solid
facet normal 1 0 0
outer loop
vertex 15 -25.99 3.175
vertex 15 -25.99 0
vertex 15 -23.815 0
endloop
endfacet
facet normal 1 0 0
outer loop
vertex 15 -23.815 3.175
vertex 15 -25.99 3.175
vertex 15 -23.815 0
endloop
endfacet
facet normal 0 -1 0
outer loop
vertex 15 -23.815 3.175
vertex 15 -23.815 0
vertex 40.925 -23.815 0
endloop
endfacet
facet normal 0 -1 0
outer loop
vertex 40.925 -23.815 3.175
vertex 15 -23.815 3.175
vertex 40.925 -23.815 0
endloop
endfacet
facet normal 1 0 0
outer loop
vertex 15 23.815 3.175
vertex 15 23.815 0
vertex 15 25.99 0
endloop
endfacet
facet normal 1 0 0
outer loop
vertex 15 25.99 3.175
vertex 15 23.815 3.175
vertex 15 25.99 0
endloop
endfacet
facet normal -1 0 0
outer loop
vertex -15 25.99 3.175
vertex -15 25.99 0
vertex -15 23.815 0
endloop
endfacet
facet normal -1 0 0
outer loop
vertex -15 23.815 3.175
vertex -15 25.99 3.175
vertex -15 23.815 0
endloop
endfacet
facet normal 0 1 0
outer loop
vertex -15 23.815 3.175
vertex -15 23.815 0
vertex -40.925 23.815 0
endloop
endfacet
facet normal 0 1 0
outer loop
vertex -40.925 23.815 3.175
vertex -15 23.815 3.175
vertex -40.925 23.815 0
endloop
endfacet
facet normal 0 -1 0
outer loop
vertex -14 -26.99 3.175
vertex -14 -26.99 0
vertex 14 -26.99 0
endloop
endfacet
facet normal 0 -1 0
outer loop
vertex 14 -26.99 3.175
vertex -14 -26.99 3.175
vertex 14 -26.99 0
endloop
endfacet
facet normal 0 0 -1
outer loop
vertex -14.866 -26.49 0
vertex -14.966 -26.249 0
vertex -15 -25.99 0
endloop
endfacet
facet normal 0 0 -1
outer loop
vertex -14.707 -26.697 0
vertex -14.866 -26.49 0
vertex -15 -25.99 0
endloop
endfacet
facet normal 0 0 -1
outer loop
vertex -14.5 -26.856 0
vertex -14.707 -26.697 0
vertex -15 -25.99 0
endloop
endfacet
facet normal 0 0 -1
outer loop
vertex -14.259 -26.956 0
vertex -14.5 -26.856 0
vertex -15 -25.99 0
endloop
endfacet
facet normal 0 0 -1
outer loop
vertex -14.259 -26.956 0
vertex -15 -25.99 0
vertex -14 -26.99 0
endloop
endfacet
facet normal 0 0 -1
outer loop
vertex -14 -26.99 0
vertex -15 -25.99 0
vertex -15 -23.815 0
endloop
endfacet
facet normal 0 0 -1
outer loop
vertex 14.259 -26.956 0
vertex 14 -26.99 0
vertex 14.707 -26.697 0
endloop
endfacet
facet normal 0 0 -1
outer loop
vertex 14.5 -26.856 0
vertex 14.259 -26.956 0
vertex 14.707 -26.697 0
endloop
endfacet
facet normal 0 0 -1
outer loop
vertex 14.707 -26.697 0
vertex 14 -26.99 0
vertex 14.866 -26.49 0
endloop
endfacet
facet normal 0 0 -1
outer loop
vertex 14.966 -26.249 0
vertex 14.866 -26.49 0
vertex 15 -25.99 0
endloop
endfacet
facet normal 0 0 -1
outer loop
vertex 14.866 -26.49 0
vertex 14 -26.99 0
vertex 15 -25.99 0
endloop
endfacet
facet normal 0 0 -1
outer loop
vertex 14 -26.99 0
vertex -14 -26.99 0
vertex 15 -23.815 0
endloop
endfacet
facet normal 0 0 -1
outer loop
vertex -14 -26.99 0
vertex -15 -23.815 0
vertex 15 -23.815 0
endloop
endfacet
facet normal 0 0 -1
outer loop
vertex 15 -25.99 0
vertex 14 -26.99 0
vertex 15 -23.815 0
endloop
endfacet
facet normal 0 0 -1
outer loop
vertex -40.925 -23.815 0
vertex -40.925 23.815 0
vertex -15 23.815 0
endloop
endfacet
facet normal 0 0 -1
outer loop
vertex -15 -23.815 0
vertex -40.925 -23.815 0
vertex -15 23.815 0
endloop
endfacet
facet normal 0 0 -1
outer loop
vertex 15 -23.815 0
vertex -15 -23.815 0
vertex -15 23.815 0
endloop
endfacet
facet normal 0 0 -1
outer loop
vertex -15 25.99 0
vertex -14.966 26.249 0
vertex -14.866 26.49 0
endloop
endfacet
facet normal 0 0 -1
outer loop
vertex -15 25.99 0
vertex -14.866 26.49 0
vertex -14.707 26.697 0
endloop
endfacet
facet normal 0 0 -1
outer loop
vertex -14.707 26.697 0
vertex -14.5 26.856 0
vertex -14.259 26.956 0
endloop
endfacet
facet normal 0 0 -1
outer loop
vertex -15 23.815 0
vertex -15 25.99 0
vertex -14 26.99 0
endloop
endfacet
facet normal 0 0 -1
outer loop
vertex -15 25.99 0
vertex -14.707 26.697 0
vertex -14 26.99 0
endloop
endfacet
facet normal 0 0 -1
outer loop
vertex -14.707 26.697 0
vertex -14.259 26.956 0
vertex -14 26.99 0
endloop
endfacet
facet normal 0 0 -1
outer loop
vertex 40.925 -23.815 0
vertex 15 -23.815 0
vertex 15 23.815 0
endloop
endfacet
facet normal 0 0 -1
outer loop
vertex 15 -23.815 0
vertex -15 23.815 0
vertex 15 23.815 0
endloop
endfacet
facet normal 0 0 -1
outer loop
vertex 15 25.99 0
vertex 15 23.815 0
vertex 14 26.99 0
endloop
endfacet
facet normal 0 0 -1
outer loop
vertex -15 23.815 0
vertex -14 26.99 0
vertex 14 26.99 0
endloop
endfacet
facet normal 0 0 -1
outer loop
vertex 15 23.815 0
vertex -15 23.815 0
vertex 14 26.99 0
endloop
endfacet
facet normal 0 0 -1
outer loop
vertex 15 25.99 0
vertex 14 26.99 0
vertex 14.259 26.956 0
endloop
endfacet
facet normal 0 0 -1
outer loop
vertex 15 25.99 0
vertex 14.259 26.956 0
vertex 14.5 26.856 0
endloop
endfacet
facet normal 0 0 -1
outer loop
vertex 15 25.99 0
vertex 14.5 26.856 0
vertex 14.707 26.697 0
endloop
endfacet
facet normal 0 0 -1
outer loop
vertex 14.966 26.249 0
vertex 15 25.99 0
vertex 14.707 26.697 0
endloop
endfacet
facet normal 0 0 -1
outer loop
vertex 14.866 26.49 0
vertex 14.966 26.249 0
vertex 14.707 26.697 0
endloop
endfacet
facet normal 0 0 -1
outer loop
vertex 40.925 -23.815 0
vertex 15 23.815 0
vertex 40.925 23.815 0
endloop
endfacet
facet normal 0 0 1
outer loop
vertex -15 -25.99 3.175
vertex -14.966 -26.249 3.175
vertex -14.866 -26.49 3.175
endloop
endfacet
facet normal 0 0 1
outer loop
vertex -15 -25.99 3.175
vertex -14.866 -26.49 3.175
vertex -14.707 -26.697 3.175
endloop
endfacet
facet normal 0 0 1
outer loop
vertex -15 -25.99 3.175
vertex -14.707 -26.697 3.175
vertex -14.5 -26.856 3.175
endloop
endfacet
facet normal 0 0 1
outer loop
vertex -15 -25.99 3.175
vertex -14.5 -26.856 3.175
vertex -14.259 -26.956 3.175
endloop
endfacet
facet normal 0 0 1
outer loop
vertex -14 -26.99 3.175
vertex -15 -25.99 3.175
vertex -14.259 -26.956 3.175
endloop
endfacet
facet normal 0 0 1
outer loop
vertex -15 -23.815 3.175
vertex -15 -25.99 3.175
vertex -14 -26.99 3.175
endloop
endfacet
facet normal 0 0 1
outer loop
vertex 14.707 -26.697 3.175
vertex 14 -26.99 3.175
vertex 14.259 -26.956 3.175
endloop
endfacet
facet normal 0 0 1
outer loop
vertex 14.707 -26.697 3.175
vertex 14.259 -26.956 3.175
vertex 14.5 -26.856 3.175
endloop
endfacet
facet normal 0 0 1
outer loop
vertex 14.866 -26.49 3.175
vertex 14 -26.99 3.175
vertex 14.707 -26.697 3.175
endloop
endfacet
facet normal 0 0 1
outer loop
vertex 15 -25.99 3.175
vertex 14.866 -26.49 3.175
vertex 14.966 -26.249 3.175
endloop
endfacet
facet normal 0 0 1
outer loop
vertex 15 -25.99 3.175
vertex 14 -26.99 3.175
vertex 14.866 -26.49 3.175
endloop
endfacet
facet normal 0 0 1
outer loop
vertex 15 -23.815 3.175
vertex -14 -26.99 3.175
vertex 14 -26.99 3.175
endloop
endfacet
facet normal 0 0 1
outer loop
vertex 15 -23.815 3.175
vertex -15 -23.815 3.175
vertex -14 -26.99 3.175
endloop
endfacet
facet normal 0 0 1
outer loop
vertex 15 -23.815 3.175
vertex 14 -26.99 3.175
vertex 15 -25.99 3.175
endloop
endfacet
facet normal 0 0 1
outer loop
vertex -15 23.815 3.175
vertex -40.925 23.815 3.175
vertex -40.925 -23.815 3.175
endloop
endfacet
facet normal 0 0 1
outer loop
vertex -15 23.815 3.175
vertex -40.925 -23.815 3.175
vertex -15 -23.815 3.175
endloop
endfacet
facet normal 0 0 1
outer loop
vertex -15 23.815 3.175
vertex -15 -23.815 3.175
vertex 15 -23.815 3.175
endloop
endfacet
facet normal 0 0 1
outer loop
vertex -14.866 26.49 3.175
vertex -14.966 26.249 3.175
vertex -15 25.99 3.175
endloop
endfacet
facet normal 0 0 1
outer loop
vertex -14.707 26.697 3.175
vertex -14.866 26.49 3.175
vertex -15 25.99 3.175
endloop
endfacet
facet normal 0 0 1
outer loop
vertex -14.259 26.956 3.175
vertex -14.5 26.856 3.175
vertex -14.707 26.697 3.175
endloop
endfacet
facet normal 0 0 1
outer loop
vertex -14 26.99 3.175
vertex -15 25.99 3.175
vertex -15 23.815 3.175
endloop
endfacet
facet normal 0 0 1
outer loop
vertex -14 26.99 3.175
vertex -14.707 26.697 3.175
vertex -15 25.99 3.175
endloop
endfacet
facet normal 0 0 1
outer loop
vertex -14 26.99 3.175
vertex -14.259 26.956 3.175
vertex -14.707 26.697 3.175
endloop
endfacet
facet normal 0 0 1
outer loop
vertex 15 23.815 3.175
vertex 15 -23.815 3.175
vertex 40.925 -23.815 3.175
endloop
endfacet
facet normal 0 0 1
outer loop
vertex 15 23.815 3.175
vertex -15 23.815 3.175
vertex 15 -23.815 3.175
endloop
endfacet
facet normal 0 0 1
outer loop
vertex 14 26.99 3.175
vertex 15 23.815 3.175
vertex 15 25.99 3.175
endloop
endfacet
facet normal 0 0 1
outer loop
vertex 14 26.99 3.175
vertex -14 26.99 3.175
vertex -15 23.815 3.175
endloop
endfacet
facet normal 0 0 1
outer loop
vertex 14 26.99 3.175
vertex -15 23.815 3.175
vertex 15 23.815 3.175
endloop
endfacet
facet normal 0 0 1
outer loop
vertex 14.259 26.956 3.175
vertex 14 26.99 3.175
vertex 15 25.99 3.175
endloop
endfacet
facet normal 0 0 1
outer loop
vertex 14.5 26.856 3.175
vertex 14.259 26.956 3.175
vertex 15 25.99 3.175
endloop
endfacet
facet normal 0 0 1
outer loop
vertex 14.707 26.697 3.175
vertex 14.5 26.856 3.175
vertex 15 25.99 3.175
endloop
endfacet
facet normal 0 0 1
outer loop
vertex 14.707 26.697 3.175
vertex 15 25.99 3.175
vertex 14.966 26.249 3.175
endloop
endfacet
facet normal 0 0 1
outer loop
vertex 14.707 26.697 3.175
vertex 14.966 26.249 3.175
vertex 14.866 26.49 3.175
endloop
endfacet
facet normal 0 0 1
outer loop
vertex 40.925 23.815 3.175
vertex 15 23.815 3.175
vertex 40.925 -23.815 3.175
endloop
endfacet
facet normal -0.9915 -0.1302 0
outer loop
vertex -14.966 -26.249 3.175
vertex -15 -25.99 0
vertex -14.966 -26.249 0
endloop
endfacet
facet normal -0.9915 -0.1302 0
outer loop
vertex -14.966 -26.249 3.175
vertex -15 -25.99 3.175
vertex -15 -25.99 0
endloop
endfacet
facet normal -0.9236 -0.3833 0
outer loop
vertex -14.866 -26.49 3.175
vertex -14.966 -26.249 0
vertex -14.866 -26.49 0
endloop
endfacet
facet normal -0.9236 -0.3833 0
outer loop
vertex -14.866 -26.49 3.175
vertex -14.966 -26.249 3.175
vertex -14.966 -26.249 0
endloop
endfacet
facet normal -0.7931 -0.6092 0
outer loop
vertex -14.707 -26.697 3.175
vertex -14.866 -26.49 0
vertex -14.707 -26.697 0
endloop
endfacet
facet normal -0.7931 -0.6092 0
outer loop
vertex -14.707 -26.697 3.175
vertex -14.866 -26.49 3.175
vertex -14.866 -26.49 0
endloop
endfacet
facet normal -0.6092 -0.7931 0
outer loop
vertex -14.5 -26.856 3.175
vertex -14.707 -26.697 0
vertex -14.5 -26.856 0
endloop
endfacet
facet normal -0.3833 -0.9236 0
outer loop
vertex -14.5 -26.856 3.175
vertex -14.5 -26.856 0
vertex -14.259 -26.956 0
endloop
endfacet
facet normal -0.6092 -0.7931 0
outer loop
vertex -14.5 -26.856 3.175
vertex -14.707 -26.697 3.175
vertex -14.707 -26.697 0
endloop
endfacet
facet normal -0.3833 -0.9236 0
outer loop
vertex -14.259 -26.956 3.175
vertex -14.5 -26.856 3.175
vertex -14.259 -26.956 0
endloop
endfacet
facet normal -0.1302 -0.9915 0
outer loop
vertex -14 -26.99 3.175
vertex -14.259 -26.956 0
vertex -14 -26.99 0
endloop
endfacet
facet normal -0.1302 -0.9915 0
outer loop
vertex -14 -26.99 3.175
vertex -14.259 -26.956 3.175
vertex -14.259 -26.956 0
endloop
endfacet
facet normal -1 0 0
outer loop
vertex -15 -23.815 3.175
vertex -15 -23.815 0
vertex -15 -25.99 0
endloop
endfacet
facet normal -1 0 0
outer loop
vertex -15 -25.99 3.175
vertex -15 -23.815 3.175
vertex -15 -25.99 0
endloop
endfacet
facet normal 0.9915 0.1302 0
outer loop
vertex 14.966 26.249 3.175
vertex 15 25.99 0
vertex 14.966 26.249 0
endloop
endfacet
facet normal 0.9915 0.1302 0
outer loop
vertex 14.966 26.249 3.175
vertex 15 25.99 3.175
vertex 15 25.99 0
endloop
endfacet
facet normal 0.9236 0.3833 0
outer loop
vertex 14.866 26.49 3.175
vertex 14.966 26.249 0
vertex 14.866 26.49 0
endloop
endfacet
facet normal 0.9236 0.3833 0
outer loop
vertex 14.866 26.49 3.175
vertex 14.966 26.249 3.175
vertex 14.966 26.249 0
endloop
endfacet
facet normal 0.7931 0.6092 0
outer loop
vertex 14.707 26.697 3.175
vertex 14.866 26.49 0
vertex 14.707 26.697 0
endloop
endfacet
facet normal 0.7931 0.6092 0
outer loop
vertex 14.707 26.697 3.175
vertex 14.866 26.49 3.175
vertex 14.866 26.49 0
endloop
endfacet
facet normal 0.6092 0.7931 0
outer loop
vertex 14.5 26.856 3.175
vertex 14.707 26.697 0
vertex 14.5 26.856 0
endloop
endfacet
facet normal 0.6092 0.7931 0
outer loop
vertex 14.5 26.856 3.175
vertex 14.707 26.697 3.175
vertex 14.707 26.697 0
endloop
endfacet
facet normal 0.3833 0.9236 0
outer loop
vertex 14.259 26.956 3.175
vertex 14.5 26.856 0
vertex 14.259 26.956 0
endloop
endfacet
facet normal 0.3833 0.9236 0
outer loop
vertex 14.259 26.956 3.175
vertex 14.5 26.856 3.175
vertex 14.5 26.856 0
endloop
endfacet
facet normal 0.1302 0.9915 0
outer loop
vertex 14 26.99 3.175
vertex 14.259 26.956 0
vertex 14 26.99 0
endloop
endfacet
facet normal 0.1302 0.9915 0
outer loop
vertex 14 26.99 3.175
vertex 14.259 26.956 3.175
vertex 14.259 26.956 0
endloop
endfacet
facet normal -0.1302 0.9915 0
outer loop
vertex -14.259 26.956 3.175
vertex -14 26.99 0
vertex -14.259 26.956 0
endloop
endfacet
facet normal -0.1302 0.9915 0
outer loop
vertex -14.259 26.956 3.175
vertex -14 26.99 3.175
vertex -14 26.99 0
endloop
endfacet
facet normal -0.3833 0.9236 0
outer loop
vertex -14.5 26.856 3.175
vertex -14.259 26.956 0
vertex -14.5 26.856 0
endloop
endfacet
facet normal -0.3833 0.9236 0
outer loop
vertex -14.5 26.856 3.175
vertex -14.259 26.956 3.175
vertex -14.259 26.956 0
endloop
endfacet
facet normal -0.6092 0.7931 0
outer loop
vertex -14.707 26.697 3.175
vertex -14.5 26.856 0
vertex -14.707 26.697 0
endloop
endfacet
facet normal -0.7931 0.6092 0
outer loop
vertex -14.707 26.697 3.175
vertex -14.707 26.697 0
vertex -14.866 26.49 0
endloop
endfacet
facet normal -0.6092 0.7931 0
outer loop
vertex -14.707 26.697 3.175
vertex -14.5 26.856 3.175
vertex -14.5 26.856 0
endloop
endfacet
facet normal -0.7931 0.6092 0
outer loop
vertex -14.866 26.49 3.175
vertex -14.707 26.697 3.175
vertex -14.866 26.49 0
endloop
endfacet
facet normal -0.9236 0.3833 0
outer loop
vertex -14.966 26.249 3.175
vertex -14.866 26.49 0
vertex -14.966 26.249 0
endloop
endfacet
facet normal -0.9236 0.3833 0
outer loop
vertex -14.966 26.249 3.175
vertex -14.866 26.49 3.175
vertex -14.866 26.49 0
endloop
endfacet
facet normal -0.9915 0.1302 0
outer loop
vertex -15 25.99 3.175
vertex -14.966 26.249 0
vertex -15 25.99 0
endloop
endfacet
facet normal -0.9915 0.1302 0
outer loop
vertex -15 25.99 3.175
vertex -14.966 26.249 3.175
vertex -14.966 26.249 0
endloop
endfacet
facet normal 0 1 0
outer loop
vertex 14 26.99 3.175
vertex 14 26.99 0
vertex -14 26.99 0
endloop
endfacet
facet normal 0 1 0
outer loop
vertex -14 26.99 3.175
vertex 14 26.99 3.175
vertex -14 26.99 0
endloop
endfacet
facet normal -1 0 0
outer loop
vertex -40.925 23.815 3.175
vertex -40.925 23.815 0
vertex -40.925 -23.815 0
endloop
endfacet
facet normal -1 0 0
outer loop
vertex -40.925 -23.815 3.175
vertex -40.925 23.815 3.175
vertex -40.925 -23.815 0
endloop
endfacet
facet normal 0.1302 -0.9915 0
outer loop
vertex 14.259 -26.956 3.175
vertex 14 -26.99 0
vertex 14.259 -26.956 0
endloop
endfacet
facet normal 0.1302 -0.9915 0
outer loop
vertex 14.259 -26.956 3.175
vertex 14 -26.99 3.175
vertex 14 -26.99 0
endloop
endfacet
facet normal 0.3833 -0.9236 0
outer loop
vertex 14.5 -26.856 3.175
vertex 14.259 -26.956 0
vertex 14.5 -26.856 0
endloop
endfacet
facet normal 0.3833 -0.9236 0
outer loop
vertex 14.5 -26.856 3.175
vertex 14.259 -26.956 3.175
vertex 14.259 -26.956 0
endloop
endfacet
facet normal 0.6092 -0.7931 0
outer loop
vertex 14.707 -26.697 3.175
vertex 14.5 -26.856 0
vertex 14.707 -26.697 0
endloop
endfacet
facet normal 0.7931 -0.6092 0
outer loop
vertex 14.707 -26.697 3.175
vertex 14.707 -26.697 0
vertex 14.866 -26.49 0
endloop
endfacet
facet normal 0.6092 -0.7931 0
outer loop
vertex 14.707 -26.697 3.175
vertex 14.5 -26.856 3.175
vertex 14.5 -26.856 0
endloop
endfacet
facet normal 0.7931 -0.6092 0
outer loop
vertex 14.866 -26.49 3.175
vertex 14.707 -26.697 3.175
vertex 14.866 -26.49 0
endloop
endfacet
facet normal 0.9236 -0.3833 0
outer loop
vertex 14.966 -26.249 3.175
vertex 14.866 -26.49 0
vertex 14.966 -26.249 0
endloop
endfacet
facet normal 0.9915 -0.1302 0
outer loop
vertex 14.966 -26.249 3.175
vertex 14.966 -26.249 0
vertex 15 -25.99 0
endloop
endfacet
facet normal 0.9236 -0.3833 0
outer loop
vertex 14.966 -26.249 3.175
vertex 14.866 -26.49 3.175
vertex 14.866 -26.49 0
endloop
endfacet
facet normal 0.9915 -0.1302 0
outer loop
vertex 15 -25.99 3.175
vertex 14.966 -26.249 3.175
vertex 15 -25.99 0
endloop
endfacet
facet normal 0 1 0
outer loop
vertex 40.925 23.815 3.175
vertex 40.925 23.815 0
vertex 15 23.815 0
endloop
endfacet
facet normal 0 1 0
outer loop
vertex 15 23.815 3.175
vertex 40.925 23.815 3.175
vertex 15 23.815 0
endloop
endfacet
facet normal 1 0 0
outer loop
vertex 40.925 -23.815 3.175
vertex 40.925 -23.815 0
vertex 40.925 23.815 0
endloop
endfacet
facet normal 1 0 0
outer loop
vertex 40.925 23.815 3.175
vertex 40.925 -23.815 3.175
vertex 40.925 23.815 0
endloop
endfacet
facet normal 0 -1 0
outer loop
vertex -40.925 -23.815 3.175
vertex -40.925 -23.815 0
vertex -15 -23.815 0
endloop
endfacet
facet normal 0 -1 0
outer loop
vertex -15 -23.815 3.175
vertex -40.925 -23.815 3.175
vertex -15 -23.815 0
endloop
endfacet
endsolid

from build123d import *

# Parameters (mm, degrees)
BOSS_EXTRUDE1_DEPTH = 3.175
FILLET1_R           = 1


with BuildPart() as part:
    # Sketch1 → Boss-Extrude1 (new body)
    with BuildSketch(Plane.XY):
        Polygon((-40.925, -23.815), (-15, -23.815), (-15, -26.99), (15, -26.99), (15, -23.815), (40.925, -23.815), (40.925, 23.815), (15, 23.815), (15, 26.99), (-15, 26.99), (-15, 23.815), (-40.925, 23.815), align=None)
    extrude(amount=BOSS_EXTRUDE1_DEPTH)

    # Fillet1
    fillet1_edges = [part.edges().sort_by_distance(p)[0] for p in [
        (-15, -26.99, 1.5875),
        (15, -26.99, 1.5875),
        (15, 26.99, 1.5875),
        (-15, 26.99, 1.5875),
    ]]
    fillet(fillet1_edges, radius=FILLET1_R)


solid = part.part
